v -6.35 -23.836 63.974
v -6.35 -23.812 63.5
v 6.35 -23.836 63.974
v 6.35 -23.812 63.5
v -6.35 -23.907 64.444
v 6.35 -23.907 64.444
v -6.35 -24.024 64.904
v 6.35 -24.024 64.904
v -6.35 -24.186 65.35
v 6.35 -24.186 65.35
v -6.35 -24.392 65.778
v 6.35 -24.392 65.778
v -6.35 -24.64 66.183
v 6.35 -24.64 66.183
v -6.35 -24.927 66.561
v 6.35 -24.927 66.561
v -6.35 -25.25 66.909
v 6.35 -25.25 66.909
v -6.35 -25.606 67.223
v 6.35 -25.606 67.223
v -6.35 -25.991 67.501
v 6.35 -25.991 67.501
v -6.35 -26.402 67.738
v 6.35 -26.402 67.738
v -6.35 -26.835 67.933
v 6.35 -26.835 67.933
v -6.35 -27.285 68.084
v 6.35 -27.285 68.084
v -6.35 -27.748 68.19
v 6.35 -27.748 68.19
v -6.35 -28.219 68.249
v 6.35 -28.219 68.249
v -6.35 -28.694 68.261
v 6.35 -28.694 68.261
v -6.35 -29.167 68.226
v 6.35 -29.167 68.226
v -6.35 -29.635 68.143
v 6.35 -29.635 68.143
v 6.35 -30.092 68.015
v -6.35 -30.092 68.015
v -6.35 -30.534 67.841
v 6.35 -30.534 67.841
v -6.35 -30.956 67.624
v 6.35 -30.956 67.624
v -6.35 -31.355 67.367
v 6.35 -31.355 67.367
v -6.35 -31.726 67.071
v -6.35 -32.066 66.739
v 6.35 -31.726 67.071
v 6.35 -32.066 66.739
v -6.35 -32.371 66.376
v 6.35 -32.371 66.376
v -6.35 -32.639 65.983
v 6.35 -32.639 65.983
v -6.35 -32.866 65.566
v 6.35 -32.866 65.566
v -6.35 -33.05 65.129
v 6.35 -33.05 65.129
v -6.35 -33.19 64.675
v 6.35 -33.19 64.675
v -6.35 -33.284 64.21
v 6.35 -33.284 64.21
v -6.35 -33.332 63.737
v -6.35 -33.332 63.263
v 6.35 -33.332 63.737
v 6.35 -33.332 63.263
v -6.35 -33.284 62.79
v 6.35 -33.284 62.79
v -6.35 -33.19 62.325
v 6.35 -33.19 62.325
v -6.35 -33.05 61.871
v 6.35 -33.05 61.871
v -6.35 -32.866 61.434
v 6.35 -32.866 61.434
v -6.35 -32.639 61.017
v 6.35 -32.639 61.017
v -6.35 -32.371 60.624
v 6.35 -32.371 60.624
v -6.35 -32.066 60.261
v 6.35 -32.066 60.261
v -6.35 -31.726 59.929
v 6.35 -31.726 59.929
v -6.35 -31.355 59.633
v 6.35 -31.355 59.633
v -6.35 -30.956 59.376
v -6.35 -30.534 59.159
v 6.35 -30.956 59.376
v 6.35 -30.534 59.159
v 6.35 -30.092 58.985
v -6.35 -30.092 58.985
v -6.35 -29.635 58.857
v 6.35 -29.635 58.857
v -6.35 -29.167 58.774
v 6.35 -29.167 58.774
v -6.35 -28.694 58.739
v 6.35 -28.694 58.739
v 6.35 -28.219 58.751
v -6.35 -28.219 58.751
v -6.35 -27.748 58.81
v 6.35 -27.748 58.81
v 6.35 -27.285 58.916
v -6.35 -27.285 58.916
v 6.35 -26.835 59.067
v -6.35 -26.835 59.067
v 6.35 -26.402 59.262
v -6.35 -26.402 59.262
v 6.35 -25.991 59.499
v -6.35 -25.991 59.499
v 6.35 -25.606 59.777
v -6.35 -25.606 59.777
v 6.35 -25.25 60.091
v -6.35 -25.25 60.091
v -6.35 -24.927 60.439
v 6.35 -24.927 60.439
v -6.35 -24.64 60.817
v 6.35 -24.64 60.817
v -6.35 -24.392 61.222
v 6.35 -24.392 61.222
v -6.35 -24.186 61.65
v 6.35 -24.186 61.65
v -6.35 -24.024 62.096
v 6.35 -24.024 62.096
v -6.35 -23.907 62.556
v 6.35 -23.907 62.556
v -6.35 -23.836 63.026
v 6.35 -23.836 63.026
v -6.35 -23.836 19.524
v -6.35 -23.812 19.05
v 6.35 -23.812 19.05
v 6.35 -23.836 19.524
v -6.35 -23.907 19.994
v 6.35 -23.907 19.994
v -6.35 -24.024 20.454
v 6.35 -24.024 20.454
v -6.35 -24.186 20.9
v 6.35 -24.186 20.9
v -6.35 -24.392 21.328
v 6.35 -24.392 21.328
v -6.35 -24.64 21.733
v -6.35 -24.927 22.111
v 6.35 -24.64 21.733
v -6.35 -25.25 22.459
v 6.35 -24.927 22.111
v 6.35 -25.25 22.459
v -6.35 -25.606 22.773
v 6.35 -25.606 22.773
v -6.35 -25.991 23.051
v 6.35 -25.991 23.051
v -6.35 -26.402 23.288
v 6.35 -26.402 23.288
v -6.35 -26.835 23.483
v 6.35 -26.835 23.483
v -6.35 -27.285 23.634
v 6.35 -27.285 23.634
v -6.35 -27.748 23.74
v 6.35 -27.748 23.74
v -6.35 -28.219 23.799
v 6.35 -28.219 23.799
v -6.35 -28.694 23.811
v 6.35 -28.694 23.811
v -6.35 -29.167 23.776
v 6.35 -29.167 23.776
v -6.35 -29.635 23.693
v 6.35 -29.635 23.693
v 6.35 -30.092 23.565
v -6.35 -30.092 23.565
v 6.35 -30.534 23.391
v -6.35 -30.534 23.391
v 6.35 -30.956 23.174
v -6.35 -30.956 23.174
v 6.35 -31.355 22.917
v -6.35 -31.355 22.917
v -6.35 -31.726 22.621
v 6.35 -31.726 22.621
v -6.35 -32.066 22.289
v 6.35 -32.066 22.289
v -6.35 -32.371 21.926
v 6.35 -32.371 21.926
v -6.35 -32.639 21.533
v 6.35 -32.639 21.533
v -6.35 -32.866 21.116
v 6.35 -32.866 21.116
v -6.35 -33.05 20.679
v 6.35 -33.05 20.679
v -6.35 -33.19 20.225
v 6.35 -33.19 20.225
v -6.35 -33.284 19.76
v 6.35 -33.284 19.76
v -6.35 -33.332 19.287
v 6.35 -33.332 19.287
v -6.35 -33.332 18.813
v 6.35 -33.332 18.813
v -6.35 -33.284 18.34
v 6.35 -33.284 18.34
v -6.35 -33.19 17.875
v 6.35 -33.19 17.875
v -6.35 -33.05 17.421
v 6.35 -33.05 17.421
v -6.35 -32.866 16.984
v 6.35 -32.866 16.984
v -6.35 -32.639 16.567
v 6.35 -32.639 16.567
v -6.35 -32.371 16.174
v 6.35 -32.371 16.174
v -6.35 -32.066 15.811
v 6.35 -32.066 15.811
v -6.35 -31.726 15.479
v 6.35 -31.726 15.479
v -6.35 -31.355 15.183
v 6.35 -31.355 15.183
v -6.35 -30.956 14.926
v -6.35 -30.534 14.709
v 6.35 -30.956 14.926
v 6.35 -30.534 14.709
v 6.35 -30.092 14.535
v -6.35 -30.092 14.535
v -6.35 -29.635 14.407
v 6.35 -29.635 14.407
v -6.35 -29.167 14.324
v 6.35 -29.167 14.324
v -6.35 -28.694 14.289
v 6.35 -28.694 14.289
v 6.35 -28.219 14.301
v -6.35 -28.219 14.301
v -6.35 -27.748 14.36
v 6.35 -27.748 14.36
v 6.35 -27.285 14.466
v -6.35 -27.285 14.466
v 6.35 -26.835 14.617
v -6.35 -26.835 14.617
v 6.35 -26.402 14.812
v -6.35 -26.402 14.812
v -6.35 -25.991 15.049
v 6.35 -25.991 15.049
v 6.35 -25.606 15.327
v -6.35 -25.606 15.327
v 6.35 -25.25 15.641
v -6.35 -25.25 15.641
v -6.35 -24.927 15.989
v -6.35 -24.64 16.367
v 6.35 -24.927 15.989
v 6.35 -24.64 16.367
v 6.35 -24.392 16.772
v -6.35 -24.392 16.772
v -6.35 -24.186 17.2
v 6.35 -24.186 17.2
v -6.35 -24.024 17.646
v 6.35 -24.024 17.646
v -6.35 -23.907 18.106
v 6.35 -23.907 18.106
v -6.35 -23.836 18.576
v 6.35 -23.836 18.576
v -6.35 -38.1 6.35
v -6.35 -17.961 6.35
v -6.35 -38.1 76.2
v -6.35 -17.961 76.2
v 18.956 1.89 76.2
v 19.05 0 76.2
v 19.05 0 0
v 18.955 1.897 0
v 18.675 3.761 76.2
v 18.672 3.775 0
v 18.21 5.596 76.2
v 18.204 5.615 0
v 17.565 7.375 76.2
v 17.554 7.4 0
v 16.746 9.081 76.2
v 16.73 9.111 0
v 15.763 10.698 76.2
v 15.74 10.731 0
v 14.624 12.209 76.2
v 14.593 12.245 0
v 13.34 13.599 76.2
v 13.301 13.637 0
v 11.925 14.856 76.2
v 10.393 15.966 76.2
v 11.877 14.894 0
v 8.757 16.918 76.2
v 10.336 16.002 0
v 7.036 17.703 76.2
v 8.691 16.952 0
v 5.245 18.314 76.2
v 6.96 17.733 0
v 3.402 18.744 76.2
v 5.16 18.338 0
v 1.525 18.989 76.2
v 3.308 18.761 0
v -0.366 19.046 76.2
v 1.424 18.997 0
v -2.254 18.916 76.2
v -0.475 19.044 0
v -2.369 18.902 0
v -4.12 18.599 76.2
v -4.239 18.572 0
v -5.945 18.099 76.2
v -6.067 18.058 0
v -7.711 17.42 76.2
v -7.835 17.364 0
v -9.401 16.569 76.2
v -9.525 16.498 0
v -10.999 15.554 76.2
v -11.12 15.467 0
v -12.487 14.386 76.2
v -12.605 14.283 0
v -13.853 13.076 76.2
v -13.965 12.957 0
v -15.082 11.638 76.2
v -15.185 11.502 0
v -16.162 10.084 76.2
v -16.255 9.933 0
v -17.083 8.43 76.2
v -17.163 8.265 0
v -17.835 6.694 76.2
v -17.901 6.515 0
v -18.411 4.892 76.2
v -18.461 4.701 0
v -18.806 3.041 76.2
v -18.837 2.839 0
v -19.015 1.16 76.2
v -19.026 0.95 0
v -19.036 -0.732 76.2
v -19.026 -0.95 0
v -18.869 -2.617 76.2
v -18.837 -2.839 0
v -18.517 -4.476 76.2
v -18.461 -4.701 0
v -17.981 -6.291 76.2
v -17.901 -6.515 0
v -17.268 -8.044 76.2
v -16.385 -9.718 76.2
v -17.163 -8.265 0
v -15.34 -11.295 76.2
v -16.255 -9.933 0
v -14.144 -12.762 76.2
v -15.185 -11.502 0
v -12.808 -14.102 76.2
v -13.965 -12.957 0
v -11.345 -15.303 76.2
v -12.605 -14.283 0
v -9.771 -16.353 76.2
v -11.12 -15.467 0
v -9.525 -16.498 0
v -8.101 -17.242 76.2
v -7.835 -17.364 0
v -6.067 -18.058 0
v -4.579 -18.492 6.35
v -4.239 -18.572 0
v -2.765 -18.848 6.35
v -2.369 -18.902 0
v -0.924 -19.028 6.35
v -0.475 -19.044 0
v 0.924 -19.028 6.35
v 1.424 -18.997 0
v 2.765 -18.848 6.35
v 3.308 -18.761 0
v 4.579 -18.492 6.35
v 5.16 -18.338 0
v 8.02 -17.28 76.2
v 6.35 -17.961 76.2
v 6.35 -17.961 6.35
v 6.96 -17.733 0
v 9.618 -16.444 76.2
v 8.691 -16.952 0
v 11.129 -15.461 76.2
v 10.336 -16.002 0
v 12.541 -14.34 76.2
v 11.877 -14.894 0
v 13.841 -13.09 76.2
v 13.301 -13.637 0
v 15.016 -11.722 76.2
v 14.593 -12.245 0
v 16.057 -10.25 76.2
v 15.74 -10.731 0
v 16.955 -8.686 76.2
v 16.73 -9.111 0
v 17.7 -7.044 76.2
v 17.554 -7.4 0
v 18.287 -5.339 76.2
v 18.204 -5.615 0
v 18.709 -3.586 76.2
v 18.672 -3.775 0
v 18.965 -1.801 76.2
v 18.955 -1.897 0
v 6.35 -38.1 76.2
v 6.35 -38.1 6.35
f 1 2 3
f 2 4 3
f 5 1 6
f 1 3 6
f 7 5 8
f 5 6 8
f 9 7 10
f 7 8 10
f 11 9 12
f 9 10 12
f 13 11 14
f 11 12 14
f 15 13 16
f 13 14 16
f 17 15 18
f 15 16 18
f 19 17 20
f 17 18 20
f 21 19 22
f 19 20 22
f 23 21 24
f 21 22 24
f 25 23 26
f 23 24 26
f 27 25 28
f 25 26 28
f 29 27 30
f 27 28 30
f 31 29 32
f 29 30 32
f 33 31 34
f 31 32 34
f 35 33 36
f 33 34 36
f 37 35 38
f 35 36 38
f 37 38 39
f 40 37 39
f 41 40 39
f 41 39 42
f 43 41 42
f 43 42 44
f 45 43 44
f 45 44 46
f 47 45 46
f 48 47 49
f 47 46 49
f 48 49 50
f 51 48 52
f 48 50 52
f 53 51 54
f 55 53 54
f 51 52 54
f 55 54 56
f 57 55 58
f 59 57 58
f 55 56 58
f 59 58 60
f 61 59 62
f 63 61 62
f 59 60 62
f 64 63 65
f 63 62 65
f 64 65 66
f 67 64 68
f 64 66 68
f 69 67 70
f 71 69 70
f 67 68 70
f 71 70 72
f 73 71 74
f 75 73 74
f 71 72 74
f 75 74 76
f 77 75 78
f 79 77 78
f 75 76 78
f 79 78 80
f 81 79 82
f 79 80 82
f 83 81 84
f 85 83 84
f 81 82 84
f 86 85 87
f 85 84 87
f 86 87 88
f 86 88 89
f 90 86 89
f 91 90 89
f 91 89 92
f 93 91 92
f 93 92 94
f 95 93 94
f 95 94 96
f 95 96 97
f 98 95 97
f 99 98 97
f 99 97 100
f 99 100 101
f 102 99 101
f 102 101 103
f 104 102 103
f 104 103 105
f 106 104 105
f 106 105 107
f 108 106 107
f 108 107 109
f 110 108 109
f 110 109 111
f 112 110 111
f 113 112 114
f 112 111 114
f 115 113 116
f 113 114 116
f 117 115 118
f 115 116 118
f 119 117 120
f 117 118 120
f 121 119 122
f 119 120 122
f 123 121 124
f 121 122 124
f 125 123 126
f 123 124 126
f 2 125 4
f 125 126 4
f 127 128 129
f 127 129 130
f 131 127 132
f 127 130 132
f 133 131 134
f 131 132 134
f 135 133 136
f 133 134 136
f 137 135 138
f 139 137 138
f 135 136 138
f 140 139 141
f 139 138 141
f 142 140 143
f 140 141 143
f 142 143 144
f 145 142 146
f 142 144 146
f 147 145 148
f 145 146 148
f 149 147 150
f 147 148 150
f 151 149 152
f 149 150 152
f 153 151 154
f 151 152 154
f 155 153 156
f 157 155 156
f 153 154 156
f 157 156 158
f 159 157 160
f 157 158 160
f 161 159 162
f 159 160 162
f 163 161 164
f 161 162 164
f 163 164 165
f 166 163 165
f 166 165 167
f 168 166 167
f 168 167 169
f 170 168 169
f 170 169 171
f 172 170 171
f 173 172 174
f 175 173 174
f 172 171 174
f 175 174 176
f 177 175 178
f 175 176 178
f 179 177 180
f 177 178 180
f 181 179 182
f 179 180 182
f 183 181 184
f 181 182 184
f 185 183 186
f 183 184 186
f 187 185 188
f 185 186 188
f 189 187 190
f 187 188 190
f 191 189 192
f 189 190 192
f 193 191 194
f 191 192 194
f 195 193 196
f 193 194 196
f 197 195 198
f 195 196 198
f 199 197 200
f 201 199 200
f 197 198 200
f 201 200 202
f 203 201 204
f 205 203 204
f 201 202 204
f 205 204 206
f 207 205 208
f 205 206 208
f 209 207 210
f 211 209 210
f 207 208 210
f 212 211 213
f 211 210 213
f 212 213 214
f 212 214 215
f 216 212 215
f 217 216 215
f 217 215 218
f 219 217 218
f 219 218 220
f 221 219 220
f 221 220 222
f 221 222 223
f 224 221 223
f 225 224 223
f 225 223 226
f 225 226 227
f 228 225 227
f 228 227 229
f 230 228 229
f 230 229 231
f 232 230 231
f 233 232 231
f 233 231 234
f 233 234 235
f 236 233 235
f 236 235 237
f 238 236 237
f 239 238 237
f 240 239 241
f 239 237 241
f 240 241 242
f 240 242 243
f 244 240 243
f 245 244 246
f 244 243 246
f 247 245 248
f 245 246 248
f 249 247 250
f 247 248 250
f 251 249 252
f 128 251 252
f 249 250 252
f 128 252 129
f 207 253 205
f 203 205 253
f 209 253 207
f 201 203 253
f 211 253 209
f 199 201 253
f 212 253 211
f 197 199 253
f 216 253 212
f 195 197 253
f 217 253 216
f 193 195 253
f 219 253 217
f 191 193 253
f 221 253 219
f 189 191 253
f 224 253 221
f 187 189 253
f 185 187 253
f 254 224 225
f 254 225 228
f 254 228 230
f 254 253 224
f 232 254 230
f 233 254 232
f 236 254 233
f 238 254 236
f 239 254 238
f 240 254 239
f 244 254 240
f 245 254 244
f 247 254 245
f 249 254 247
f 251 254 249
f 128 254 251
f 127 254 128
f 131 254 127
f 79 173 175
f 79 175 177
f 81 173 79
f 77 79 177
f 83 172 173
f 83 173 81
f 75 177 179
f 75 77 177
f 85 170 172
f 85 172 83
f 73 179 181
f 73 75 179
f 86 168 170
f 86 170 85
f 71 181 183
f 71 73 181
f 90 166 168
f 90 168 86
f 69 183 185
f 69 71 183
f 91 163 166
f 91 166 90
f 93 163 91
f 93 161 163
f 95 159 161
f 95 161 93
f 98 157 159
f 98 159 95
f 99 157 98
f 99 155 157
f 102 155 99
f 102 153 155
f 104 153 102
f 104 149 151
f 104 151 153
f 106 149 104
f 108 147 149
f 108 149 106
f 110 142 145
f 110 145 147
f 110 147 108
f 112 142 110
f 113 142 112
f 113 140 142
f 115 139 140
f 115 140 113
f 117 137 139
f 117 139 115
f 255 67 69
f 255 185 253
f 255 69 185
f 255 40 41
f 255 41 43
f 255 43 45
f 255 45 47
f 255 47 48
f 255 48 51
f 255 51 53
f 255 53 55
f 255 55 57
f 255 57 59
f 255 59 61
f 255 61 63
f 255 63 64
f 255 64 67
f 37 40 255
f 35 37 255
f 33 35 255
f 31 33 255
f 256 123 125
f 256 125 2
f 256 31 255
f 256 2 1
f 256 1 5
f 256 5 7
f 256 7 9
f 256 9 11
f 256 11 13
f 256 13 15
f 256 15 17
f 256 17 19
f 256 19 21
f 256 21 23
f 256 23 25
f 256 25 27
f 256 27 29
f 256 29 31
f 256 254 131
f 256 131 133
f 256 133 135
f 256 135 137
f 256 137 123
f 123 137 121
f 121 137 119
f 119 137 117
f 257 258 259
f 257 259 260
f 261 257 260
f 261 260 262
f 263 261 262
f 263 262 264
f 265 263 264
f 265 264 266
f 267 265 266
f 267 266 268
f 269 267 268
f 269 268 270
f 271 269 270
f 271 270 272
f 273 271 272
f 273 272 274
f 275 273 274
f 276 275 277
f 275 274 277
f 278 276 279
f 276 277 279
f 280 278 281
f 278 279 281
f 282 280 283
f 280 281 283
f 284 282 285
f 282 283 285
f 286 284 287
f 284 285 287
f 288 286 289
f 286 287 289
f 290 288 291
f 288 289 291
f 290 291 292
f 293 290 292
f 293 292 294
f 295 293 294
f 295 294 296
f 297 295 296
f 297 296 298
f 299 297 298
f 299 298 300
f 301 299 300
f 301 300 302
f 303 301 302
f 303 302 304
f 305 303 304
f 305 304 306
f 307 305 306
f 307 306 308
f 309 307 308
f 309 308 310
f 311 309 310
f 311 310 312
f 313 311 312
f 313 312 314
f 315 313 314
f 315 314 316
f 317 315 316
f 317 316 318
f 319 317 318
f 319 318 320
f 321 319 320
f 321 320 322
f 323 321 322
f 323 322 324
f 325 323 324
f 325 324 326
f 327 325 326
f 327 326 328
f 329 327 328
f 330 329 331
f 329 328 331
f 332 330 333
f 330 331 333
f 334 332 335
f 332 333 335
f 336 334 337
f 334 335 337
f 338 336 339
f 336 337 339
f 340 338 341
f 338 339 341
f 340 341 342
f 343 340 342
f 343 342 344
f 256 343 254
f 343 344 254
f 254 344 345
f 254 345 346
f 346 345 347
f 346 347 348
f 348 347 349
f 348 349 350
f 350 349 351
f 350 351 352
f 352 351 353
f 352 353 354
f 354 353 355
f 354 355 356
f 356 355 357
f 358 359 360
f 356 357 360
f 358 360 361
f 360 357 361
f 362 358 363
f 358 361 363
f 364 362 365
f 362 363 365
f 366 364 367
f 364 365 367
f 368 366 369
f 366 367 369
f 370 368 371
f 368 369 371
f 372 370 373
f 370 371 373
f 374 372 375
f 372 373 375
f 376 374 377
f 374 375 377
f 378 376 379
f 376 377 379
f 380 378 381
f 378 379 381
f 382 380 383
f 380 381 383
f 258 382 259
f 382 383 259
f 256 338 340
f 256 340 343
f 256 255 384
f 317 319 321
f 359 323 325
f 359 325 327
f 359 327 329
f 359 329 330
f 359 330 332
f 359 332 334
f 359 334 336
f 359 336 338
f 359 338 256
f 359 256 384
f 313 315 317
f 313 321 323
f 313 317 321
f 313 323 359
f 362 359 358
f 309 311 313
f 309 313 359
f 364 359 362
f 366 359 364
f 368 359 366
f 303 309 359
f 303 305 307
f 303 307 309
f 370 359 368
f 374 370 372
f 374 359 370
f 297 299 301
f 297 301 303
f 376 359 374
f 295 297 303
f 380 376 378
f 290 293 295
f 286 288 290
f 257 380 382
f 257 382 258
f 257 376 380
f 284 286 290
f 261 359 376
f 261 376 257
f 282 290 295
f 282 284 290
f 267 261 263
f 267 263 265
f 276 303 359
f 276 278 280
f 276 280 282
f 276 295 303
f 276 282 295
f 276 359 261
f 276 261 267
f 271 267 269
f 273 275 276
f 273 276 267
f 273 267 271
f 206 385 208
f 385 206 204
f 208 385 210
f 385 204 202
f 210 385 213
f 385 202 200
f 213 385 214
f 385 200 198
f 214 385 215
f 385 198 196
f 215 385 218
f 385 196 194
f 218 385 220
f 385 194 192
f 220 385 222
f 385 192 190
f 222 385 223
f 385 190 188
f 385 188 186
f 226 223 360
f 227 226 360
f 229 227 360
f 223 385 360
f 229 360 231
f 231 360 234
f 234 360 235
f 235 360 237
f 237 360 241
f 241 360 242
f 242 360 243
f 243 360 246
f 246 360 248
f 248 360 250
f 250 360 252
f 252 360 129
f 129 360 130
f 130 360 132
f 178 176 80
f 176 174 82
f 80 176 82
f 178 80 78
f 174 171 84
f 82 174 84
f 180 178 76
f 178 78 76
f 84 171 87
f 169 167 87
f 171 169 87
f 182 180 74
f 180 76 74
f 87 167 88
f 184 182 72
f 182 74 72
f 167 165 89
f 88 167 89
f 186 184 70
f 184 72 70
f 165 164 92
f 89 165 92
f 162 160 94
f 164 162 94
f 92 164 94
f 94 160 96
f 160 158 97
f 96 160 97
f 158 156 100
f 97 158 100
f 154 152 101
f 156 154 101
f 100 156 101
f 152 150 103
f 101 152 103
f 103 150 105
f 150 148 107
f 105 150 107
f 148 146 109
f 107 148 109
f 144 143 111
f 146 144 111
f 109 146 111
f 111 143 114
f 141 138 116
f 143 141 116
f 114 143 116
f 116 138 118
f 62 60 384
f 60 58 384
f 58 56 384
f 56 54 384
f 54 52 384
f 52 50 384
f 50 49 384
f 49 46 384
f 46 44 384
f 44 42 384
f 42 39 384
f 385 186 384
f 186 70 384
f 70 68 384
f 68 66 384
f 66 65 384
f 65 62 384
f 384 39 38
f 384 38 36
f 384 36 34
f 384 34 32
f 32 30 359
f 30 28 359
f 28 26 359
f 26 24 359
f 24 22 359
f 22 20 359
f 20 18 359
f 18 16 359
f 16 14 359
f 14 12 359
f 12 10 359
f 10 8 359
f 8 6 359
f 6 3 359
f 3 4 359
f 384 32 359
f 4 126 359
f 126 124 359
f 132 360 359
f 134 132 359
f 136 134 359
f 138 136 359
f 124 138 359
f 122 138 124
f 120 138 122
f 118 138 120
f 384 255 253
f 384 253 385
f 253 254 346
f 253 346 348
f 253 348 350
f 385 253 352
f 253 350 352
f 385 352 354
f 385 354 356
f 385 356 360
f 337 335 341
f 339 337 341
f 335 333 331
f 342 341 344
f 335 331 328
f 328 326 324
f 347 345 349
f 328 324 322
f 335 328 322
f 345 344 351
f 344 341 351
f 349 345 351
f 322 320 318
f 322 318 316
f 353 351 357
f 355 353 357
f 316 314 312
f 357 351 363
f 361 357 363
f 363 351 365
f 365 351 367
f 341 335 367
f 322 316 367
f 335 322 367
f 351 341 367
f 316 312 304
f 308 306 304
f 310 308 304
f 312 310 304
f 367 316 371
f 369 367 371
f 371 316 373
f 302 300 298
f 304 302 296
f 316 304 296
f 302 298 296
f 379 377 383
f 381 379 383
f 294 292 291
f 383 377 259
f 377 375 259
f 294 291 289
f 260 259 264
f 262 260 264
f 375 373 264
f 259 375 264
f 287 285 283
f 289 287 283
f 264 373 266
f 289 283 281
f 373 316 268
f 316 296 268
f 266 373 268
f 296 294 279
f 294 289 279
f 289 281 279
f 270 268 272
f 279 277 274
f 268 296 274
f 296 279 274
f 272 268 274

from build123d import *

# Parameters (mm, degrees)
F0_R     = 19.05
F1_DEPTH = 76.2
F2_W     = 12.7
F2_H     = 69.85
F3_DEPTH = 38.1
F4_R     = 4.7625
F5_DEPTH = 12.7


with BuildPart() as f1:
    # F0 (on Top) → F1 (new body)
    with BuildSketch(Plane.XY):
        Circle(F0_R)
    extrude(amount=F1_DEPTH)

    # F2 (on Front) → F3 (join)
    with BuildSketch(Plane.XZ):
        with Locations((0, 41.275)):
            Rectangle(F2_W, F2_H)
    extrude(amount=F3_DEPTH)

    # F4 (on Right) → F5 (cut, symmetric)
    with BuildSketch(Plane.YZ):
        with Locations((-28.575, 63.5)):
            Circle(F4_R)
        with Locations((-28.575, 19.05)):
            Circle(F4_R)
    extrude(amount=F5_DEPTH, both=True, mode=Mode.SUBTRACT)


solid = f1.part
